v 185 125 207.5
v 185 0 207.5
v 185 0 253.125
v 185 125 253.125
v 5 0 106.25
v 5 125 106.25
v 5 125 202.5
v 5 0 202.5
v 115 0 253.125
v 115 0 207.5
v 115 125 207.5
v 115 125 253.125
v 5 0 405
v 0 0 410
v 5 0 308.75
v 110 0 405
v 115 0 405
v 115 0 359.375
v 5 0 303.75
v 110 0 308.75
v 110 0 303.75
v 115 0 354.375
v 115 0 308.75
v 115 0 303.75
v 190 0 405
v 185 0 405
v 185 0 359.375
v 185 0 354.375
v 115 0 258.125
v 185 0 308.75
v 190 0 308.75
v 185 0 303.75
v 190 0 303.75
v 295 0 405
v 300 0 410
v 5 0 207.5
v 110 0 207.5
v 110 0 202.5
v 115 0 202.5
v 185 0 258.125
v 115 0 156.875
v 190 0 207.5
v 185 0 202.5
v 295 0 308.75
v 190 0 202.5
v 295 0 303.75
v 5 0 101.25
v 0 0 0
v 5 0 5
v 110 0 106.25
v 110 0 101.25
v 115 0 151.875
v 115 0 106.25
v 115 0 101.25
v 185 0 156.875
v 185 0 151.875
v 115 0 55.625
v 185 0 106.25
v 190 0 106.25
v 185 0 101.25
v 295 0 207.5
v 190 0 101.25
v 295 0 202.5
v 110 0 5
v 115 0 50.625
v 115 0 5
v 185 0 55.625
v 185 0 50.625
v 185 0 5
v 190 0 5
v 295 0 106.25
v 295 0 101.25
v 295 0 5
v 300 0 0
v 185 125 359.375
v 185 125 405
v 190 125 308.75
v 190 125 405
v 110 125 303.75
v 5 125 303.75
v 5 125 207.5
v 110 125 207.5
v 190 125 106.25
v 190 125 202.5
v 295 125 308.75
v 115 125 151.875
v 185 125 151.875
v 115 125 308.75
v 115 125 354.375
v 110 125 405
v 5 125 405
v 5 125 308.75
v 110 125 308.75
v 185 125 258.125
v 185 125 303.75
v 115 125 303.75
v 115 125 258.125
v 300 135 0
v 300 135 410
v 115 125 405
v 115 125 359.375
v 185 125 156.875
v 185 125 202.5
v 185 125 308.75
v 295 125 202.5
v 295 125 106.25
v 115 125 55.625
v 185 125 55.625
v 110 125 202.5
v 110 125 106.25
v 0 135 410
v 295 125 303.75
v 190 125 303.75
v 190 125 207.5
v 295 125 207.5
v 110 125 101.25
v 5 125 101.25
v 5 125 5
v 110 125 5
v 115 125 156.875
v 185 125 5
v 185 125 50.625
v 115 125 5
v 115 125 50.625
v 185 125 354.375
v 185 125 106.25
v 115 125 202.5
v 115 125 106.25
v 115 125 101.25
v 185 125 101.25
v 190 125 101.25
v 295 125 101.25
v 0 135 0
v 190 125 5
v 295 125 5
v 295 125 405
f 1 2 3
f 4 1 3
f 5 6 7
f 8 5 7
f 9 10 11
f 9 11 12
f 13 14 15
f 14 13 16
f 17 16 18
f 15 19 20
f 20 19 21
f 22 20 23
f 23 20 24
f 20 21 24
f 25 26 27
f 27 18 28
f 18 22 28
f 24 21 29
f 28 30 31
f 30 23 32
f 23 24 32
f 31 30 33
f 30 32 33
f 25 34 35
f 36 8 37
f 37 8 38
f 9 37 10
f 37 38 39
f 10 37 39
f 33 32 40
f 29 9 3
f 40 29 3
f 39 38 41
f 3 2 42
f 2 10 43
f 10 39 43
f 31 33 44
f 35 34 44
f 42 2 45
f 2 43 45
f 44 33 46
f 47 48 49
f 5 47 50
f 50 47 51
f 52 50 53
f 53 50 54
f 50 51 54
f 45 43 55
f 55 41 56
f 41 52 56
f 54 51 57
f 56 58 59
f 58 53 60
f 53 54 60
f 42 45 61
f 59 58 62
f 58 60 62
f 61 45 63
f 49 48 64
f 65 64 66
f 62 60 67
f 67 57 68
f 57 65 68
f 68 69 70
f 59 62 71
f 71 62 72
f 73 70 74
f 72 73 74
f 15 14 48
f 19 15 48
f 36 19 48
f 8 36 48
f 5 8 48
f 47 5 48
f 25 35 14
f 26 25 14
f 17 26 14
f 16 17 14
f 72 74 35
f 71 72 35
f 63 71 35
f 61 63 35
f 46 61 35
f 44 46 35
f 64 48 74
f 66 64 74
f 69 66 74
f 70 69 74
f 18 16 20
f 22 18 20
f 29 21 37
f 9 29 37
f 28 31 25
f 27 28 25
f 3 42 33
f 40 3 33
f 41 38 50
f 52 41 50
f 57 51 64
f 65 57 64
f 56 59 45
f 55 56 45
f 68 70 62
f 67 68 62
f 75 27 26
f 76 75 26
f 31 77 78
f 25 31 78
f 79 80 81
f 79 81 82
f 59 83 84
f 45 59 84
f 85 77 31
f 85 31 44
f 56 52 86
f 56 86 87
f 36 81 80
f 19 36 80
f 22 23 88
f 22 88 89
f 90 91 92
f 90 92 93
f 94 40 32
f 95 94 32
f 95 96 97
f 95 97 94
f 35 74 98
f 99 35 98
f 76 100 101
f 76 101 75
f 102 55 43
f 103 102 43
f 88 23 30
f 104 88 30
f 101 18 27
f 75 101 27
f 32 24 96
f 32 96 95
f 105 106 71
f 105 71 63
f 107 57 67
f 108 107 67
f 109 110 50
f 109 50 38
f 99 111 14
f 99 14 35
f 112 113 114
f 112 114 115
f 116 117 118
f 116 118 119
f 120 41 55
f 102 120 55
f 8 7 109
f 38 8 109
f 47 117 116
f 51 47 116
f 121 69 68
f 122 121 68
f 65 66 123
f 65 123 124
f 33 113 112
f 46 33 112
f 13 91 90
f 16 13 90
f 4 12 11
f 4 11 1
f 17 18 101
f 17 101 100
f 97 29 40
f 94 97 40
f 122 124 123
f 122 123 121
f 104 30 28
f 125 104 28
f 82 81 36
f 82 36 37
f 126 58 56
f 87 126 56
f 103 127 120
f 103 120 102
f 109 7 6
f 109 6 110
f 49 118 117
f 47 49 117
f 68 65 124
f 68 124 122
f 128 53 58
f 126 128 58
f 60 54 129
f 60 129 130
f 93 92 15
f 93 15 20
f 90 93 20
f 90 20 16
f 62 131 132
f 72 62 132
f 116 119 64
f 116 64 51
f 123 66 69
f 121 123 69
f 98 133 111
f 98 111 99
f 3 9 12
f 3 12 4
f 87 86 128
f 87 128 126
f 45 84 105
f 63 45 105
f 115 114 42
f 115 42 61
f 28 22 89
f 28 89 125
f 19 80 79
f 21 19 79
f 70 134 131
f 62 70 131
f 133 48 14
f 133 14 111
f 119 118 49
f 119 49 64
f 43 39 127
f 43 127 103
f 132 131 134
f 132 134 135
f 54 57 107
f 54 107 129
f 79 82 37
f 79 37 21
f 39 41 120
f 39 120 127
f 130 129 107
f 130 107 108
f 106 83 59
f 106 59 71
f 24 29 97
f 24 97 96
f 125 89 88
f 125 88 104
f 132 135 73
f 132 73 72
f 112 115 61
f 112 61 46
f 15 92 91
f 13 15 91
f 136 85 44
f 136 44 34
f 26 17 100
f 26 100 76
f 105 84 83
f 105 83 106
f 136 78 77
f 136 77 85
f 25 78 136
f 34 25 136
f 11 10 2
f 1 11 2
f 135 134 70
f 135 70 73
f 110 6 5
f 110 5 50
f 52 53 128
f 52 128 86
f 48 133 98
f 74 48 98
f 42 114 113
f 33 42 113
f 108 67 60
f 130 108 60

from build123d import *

# Parameters (mm, degrees)
F0_W     = 300
F0_H     = 135
F1_DEPTH = 410
F2_W     = 105
F2_H     = 96.25
F2_W_2   = 70
F2_H_2   = 45.625
F3_DEPTH = 125


with BuildPart() as f1:
    # F0 (on Top) → F1 (new body)
    with BuildSketch(Plane.XY):
        with Locations((150, 67.5)):
            Rectangle(F0_W, F0_H)
    extrude(amount=F1_DEPTH)

    # F2 (on face) → F3 (cut)
    with BuildSketch(Plane.XZ):
        with Locations((242.5, 356.875)):
            Rectangle(F2_W, F2_H)
        with Locations((150, 230.3125)):
            Rectangle(F2_W_2, F2_H_2)
        with Locations((150, 280.9375)):
            Rectangle(F2_W_2, F2_H_2)
        with Locations((150, 331.5625)):
            Rectangle(F2_W_2, F2_H_2)
        with Locations((150, 382.1875)):
            Rectangle(F2_W_2, F2_H_2)
        with Locations((150, 179.6875)):
            Rectangle(F2_W_2, F2_H_2)
        with Locations((150, 129.0625)):
            Rectangle(F2_W_2, F2_H_2)
        with Locations((150, 78.4375)):
            Rectangle(F2_W_2, F2_H_2)
        with Locations((242.5, 53.125)):
            Rectangle(F2_W, F2_H)
        with Locations((150, 27.8125)):
            Rectangle(F2_W_2, F2_H_2)
        with Locations((57.5, 53.125)):
            Rectangle(F2_W, F2_H)
        with Locations((57.5, 154.375)):
            Rectangle(F2_W, F2_H)
        with Locations((57.5, 255.625)):
            Rectangle(F2_W, F2_H)
        with Locations((57.5, 356.875)):
            Rectangle(F2_W, F2_H)
        with Locations((242.5, 255.625)):
            Rectangle(F2_W, F2_H)
        with Locations((242.5, 154.375)):
            Rectangle(F2_W, F2_H)
    extrude(amount=-F3_DEPTH, mode=Mode.SUBTRACT)


solid = f1.part
